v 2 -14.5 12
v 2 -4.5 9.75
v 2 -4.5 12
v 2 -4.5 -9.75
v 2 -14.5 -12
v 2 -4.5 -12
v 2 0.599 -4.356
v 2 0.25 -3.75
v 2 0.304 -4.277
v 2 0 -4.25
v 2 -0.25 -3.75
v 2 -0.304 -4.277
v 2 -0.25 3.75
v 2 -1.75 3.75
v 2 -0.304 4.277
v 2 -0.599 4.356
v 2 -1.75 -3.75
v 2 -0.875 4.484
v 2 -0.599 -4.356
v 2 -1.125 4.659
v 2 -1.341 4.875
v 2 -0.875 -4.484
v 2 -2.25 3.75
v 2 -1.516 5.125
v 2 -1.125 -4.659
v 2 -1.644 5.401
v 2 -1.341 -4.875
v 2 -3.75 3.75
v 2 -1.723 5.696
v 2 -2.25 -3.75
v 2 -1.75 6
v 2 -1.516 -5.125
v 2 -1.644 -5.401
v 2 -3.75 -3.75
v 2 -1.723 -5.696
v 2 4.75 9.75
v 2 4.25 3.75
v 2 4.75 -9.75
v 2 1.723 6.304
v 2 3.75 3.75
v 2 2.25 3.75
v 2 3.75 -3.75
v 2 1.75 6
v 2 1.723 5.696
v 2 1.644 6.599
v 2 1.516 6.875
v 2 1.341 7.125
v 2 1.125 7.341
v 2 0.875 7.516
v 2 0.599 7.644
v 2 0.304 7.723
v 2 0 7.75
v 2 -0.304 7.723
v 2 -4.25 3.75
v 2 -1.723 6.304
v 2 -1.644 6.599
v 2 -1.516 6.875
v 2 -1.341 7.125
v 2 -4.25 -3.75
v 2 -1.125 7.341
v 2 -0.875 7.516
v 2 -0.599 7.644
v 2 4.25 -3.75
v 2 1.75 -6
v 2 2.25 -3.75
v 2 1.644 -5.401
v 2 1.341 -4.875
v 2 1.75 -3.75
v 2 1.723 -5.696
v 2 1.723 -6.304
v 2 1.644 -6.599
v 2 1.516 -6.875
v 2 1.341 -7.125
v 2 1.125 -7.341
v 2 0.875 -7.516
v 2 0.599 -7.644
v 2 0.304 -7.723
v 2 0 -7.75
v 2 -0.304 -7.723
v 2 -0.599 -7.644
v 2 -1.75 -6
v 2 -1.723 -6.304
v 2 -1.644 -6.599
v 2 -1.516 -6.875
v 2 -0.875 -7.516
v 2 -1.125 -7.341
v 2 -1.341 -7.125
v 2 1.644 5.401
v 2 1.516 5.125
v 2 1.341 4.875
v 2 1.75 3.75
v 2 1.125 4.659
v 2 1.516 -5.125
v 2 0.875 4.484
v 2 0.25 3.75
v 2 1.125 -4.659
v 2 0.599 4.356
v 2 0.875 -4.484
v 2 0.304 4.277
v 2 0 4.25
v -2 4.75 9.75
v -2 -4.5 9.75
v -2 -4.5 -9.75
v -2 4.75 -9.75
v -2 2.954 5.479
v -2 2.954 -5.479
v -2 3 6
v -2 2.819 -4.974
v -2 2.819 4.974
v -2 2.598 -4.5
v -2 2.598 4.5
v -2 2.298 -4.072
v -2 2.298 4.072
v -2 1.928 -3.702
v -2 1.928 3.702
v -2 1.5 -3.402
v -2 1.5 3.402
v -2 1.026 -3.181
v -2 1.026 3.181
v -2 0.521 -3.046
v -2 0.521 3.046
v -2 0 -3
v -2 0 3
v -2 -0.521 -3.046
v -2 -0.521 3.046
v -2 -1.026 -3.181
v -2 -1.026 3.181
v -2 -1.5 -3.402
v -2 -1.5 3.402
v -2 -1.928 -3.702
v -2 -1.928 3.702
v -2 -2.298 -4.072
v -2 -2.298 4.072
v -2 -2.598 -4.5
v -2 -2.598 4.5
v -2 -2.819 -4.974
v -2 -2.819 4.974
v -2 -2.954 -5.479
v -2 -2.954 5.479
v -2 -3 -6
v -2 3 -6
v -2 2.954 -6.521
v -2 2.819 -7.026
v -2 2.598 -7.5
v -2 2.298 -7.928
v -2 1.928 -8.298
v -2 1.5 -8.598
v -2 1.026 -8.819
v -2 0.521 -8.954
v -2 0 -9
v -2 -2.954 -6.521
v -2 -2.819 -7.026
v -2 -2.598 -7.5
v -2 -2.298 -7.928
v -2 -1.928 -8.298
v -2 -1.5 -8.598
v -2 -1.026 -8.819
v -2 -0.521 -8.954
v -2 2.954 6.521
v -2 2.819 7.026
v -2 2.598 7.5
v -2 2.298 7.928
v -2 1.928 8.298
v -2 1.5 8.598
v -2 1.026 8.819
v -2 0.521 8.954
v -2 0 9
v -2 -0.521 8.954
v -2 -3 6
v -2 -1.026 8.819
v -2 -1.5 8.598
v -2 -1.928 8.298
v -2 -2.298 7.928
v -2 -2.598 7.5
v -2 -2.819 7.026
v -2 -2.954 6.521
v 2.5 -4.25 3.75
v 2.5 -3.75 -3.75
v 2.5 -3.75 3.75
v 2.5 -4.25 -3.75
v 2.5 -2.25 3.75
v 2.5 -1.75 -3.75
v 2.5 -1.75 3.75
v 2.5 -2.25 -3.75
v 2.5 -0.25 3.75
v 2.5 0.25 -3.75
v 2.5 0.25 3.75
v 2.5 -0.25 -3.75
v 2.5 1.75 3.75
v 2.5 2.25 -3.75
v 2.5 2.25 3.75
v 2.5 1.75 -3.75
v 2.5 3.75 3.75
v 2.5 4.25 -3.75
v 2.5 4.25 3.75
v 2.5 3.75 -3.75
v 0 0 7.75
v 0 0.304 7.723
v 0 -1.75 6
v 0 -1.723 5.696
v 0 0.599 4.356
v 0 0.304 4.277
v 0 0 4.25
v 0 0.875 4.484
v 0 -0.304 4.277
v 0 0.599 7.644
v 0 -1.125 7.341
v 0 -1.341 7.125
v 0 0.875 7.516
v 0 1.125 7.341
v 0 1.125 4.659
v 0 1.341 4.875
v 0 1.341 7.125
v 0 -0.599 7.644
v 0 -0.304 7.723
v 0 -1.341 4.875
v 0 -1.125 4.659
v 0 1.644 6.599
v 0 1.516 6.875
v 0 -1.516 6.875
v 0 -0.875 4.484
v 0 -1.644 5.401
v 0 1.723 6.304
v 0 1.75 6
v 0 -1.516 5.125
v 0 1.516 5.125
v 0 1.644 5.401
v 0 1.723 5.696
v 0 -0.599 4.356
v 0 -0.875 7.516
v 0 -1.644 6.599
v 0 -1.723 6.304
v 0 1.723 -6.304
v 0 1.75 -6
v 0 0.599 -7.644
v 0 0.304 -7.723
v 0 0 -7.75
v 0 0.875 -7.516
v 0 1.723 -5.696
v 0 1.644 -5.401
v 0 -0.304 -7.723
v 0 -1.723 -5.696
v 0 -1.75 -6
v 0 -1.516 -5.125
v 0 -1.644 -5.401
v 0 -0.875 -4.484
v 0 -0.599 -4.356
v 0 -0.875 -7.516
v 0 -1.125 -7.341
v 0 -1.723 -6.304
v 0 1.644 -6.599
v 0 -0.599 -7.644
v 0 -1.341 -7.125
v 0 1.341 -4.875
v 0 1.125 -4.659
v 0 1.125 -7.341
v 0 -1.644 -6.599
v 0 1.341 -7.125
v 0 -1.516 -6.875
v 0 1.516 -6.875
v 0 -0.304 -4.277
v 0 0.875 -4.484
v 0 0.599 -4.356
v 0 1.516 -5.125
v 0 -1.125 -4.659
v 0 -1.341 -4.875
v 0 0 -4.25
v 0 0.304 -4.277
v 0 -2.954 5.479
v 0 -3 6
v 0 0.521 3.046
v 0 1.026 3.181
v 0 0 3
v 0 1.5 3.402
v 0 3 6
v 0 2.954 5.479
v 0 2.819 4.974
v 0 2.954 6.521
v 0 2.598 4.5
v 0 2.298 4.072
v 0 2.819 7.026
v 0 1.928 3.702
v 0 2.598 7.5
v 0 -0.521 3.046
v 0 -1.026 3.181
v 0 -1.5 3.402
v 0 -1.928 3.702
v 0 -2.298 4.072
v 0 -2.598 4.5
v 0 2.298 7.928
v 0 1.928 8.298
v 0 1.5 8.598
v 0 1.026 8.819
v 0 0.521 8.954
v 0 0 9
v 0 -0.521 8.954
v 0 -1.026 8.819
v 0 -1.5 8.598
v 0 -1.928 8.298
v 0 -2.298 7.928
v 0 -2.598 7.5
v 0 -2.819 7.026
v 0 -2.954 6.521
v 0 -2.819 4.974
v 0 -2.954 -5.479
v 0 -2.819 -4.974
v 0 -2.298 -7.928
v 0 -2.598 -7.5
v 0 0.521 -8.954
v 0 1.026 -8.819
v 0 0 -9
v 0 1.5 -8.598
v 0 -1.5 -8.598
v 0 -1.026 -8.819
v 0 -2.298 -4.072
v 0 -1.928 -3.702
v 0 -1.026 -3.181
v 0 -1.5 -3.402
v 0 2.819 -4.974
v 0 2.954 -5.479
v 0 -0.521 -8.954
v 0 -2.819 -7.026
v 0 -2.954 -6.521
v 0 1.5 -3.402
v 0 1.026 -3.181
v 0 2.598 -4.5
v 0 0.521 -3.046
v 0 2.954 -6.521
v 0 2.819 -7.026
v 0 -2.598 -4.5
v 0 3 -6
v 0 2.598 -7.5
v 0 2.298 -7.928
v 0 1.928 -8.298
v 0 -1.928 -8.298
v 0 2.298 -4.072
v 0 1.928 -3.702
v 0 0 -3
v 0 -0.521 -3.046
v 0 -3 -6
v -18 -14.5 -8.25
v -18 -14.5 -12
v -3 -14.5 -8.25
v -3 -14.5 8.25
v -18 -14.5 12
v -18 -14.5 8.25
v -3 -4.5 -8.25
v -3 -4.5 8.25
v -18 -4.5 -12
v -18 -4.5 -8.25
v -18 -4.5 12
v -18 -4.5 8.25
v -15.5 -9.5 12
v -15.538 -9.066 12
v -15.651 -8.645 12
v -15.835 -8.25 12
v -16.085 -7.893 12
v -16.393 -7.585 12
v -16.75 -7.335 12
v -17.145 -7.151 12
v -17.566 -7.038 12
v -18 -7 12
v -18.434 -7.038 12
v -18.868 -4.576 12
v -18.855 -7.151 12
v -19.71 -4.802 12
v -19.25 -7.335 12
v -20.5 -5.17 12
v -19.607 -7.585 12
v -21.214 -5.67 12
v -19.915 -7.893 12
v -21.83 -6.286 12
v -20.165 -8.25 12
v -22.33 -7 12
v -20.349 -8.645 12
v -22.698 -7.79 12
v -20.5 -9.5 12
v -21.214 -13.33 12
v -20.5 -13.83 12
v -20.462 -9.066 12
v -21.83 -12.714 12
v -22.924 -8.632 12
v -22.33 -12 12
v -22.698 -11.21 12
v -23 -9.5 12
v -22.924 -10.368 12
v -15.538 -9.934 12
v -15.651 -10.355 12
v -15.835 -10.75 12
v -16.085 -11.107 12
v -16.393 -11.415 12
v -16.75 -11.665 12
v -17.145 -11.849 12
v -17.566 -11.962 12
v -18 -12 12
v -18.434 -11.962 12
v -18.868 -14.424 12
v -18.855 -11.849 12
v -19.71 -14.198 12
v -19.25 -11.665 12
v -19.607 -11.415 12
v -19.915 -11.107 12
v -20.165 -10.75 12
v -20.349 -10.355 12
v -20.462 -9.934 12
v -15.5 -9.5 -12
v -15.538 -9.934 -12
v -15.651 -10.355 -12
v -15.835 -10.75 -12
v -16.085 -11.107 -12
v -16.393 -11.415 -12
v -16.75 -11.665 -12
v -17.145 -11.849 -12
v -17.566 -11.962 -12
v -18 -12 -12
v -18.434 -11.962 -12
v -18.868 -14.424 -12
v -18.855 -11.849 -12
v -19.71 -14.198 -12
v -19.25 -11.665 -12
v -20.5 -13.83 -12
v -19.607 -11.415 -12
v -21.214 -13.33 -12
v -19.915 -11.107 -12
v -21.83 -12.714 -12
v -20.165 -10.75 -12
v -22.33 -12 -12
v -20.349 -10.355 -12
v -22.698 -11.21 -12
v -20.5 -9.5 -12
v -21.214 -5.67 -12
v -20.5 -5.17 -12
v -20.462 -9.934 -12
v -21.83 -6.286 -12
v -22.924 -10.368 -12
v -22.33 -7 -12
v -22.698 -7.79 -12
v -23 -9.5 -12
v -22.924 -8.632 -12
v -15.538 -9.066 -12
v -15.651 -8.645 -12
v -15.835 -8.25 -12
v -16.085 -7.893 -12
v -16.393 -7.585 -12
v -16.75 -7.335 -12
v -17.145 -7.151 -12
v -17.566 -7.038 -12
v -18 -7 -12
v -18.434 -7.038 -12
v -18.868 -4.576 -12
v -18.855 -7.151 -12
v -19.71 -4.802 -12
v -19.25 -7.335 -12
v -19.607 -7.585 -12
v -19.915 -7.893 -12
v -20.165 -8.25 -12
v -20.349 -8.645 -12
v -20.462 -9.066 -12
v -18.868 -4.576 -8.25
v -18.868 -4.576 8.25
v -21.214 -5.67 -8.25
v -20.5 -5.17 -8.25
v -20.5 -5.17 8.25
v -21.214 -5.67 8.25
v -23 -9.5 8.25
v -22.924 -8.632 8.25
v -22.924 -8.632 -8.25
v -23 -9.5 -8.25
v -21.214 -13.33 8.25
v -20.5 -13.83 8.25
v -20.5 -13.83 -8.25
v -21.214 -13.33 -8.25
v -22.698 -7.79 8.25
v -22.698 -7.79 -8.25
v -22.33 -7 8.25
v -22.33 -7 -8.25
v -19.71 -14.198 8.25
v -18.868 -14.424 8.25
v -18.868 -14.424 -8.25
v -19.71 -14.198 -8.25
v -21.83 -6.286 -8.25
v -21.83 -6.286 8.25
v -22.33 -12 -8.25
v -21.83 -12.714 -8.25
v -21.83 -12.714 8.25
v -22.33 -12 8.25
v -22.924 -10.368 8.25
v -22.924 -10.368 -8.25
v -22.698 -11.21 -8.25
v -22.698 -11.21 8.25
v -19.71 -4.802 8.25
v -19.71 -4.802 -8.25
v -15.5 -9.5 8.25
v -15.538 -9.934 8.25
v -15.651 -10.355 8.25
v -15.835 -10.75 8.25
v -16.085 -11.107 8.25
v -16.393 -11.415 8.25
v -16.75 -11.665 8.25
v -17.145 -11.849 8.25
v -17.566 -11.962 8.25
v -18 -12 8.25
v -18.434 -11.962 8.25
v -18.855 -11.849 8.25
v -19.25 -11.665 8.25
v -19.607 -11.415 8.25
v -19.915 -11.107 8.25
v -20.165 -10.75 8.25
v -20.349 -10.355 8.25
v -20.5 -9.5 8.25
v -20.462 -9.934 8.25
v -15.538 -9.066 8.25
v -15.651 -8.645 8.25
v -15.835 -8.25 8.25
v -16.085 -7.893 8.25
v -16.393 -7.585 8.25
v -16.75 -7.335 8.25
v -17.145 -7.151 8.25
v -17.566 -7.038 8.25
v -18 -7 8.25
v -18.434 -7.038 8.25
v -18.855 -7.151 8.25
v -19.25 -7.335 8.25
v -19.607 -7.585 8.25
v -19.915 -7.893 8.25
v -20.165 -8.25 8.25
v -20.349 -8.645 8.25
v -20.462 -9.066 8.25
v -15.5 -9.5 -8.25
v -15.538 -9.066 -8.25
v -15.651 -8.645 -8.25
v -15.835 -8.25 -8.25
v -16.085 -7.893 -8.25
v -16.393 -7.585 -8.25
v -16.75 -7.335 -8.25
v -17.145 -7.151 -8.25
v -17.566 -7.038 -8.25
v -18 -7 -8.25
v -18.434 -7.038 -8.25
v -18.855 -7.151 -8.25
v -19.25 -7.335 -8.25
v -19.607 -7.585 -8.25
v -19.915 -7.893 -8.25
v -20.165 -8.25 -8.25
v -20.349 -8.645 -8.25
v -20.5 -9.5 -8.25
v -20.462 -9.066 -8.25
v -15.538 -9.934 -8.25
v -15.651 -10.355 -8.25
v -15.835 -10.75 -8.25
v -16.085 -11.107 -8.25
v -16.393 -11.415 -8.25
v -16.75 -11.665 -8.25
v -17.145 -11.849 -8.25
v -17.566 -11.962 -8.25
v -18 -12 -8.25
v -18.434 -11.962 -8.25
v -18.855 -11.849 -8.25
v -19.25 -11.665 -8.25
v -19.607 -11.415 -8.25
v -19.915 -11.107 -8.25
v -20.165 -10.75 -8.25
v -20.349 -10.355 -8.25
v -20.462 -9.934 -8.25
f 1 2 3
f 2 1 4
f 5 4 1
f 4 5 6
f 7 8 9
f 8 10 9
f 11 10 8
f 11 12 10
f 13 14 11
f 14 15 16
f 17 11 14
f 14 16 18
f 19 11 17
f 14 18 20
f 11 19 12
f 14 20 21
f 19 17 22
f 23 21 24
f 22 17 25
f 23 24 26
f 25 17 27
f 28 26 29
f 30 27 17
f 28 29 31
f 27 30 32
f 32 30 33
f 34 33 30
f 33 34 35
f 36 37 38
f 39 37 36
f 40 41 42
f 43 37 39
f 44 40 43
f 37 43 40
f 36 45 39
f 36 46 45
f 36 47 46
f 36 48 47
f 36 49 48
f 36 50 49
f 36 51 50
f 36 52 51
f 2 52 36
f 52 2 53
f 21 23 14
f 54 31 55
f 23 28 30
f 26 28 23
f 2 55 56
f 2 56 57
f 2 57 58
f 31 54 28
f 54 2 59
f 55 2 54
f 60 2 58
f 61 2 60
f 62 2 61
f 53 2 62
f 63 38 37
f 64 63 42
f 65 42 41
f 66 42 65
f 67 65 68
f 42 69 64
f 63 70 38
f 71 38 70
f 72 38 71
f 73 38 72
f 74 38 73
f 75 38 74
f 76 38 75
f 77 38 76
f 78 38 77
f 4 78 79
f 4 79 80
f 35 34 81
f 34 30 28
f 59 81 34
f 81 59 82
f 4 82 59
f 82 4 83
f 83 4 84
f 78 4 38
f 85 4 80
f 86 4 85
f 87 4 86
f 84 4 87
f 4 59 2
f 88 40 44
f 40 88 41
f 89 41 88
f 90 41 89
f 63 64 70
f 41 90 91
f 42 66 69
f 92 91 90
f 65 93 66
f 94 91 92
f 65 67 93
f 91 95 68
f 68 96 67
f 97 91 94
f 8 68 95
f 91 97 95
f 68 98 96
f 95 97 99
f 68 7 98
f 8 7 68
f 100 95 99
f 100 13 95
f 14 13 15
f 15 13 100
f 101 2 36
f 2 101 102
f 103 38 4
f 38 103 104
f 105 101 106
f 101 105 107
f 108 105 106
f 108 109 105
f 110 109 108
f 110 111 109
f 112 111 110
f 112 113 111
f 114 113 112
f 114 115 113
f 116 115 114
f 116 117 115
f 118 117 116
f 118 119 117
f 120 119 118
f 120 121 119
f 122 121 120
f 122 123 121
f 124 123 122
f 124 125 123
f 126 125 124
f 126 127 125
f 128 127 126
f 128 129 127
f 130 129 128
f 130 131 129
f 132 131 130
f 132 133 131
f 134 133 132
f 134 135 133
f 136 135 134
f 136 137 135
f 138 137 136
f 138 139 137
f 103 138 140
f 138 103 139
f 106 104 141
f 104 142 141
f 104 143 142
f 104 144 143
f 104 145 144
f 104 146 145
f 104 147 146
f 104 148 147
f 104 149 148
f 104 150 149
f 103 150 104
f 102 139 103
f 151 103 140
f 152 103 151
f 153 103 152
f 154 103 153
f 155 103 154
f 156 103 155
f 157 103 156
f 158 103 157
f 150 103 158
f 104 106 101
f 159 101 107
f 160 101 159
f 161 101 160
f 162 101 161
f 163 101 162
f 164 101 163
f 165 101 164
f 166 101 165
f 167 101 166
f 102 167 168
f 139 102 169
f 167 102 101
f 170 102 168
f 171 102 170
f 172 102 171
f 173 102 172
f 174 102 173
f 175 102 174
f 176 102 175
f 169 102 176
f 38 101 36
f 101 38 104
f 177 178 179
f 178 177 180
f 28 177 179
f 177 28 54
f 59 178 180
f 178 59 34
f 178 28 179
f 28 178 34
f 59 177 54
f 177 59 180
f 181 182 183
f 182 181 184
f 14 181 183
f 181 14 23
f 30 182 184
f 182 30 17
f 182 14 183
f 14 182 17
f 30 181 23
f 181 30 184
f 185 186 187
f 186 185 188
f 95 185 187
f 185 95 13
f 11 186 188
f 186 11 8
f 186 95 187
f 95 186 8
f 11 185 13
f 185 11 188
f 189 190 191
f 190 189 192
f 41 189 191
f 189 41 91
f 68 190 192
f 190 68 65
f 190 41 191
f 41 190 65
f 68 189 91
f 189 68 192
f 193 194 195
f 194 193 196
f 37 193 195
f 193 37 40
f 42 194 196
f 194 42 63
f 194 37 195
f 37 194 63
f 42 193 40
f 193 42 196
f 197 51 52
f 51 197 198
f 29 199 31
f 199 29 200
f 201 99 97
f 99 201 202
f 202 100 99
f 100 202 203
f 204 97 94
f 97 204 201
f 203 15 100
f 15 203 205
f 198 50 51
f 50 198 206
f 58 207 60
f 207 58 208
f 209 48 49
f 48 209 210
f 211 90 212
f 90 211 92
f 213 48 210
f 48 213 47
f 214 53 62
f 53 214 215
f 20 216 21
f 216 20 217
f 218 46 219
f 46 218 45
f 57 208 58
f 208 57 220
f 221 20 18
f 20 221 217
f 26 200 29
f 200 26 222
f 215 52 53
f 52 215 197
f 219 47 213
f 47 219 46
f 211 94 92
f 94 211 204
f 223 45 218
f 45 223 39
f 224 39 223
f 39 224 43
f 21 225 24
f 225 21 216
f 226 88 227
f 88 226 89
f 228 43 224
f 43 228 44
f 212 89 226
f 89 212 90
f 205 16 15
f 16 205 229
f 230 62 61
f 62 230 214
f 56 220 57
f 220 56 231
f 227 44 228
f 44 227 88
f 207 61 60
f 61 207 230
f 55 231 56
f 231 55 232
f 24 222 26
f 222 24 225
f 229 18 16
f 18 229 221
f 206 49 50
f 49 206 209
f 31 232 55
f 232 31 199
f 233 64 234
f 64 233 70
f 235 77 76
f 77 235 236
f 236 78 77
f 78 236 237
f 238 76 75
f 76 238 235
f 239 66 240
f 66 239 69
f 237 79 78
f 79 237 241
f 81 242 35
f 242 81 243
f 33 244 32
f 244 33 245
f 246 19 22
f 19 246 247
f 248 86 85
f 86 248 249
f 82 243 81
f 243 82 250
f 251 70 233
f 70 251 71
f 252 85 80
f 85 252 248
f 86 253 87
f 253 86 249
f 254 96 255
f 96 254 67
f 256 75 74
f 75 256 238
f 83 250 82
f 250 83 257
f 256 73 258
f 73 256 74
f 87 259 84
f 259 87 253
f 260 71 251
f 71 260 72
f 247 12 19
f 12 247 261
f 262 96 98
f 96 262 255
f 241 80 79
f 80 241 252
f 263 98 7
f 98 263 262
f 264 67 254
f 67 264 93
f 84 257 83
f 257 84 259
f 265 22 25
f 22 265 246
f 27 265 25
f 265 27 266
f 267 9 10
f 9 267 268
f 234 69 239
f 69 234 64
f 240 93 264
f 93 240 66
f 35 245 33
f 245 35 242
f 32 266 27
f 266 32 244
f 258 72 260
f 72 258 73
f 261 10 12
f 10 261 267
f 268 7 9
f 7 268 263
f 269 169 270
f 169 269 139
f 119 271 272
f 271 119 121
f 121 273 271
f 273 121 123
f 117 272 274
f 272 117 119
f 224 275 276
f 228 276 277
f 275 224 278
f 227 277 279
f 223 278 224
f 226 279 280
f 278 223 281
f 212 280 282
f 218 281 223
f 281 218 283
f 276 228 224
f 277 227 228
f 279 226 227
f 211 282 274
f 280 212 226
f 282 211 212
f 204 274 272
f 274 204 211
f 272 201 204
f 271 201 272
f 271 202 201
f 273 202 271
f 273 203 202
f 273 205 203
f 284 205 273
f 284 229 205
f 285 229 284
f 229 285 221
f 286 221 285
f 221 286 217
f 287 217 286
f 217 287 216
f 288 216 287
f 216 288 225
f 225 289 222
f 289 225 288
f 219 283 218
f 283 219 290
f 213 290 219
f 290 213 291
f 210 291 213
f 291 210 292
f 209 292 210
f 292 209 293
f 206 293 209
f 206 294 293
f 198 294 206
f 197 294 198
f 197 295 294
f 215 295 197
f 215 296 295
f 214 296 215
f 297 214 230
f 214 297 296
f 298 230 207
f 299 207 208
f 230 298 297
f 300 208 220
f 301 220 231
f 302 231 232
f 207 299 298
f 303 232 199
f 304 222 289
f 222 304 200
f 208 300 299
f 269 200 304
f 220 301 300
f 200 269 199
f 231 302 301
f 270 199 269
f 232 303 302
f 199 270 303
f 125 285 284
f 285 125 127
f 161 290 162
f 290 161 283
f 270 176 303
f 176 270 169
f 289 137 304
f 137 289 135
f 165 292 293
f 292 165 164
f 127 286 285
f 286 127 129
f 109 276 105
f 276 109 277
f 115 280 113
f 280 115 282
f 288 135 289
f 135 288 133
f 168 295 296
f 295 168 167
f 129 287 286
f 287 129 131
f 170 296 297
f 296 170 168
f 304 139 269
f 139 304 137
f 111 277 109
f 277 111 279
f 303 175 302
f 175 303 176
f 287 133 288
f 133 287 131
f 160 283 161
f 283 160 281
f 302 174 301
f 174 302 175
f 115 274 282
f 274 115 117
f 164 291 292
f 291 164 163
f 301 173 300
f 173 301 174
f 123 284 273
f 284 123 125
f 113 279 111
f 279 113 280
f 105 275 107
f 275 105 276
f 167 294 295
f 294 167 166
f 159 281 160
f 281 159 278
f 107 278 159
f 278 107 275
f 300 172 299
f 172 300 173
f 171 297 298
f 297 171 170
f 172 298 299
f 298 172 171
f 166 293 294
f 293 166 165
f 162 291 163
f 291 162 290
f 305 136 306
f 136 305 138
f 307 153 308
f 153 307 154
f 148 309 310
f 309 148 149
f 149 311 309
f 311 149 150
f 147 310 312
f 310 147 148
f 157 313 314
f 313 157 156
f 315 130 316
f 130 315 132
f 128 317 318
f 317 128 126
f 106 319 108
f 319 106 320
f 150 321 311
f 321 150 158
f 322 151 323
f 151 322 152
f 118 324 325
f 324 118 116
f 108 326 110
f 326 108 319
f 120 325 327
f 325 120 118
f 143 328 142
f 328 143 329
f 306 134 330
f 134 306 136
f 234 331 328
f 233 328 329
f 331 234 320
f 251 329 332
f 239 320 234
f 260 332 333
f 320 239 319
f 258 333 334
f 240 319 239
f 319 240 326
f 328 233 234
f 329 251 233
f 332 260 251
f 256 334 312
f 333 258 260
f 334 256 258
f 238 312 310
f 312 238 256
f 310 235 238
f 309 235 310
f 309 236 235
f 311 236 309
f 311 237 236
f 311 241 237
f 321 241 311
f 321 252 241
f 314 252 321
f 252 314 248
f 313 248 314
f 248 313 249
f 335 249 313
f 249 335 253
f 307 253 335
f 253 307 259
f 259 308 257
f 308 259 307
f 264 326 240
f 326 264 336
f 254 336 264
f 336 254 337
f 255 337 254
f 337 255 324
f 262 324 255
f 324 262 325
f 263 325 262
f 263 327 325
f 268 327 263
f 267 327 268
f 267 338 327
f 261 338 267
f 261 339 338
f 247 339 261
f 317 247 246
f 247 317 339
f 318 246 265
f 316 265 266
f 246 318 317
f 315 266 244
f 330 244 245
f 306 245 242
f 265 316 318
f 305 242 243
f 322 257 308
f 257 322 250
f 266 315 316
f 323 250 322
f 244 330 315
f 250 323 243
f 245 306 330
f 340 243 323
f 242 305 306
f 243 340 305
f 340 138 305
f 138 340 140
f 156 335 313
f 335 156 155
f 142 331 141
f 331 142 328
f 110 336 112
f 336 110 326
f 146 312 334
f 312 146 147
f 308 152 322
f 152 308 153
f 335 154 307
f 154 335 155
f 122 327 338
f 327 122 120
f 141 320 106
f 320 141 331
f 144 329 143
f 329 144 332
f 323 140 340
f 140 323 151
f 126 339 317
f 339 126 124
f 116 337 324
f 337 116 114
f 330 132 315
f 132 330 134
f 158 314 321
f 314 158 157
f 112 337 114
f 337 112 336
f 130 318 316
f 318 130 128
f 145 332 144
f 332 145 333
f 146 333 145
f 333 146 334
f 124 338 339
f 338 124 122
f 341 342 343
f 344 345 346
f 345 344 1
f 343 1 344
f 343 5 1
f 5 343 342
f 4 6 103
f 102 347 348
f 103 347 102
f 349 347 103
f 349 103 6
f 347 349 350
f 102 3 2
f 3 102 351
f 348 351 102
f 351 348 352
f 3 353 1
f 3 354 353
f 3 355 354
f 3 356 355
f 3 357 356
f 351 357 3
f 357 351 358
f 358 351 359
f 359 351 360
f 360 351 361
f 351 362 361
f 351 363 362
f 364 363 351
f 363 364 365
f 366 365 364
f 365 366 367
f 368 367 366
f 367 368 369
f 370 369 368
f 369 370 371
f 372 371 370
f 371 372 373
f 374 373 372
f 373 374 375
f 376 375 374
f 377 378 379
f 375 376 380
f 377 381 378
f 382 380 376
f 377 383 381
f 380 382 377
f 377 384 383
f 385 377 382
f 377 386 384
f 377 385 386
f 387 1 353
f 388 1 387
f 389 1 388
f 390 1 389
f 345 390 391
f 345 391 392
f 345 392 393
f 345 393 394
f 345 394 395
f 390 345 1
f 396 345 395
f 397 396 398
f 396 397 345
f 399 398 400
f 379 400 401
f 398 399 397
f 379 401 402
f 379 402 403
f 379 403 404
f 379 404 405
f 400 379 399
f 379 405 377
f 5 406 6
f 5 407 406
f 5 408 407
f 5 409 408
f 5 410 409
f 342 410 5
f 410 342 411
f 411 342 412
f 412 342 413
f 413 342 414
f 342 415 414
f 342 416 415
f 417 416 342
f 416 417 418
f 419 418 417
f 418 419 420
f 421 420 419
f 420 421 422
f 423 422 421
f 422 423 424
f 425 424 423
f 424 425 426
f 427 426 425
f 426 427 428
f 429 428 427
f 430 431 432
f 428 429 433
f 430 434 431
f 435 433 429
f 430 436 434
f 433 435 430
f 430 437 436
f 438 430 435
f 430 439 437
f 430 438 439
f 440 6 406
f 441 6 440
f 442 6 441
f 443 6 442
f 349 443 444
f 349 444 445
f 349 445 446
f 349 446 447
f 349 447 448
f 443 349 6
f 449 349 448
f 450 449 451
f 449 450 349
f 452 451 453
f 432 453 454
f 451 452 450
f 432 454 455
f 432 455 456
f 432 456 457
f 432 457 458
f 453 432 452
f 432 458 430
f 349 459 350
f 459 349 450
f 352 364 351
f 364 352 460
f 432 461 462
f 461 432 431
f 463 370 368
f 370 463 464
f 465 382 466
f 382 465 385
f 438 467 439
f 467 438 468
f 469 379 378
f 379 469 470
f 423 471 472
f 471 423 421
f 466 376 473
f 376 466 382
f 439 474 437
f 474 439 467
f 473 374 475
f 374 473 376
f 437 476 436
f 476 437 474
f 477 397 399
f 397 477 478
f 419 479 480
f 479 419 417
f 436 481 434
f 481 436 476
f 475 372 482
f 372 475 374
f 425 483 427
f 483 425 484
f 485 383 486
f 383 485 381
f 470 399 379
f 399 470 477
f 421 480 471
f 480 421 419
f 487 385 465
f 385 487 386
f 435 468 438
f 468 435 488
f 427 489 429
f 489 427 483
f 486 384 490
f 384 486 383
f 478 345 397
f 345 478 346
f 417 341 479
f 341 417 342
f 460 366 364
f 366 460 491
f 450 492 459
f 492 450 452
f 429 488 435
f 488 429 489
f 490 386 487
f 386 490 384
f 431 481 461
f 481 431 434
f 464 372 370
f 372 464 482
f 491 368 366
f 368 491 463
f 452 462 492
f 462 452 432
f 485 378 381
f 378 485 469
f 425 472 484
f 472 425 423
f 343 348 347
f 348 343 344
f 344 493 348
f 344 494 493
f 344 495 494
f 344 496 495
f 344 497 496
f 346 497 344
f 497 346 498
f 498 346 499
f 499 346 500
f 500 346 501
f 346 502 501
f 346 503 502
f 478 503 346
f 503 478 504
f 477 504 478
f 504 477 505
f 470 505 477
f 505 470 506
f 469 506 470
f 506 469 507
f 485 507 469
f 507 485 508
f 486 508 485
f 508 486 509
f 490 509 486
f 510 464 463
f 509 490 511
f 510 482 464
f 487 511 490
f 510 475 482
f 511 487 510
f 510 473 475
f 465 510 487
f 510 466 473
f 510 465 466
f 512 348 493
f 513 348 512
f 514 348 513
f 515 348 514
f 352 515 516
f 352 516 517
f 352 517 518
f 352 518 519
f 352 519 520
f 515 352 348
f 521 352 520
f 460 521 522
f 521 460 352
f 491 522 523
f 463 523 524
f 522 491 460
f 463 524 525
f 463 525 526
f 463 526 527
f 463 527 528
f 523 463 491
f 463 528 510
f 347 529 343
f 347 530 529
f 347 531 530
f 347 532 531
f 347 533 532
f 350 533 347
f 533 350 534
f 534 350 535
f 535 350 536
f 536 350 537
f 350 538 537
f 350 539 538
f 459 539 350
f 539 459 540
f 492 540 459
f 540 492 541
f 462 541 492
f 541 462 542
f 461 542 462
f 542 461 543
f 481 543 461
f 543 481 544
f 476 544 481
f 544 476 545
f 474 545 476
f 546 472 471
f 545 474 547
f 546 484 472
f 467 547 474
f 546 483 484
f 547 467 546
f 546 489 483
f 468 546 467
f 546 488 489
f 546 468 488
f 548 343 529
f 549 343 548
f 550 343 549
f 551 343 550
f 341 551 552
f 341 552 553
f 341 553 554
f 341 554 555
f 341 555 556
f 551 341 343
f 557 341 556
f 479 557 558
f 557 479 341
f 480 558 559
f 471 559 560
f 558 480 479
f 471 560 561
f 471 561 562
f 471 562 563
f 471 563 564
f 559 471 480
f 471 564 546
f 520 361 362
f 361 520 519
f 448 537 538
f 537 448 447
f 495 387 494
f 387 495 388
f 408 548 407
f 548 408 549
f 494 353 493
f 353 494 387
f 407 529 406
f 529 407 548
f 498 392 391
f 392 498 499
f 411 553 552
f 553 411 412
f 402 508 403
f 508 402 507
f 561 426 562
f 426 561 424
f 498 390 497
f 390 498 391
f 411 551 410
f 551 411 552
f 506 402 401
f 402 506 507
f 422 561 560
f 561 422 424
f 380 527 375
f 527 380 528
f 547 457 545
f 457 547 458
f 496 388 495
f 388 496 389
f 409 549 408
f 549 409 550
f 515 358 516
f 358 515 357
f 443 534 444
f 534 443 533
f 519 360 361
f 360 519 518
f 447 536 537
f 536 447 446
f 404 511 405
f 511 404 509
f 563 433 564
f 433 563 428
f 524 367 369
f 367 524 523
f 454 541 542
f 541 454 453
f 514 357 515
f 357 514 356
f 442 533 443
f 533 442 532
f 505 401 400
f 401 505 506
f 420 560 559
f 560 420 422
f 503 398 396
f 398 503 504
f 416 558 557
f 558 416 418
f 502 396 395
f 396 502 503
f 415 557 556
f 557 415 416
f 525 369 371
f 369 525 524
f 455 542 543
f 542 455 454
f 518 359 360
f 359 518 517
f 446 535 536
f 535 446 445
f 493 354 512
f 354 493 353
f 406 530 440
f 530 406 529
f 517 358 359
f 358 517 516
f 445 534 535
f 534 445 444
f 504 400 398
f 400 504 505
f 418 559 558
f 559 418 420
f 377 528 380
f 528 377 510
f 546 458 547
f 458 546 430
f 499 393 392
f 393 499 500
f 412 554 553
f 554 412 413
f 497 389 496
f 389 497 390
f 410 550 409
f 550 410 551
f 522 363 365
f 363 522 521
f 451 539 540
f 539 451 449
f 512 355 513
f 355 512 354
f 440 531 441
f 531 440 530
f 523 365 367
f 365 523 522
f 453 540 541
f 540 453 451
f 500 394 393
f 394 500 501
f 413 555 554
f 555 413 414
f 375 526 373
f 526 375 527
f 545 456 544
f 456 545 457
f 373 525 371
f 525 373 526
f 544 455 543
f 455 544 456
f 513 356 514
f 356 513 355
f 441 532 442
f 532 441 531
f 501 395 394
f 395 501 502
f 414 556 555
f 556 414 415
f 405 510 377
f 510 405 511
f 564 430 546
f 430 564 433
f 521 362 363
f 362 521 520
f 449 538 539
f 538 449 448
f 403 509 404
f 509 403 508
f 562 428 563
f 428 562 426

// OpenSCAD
/*
 * Machdyne PNP
 * Copyright (c) 2023 Lone Dynamics Corporation. All rights reserved.
 *
 * Belt Clamp
 *
 * This part attaches to the gantry mount (xgm) in order to hold the belt ends in place.
 *
 * Optionally has a mount point for the drag chain.
 *
 */
 
$fn = 36;
 
has_dc_mount = true;
 
gmbc();
 
module gmbc() {
	
	difference() {
	
		union() {
			cube([4,9.5,19.5], center=true);
			
			translate([2,-4,0]) cube([1,0.5,7.5], center=true);
			translate([2,-2,0]) cube([1,0.5,7.5], center=true);
			translate([2,0,0]) cube([1,0.5,7.5], center=true);
			translate([2,2,0]) cube([1,0.5,7.5], center=true);
			translate([2,4,0]) cube([1,0.5,7.5], center=true);
			
		}
		
		rotate([0,90,0]) {
			translate([-6,0,0]) cylinder(d=3.5, h=100, center=true);
			translate([6,0,0]) cylinder(d=3.5, h=100, center=true);
			translate([-6,0,-2.5]) cylinder(d=6, h=5, center=true);
			translate([6,0,-2.5]) cylinder(d=6, h=5, center=true);

		}


	}
	
	if (has_dc_mount) {
	
		translate([-8,-9.5,0]) rotate([90,0,0]) {
		
			difference() {
				
				union() {
					cube([20,24,10], center=true);	
					translate([-10,0,0]) rotate([90,0,0]) cylinder(d=10, h=24, center=true);
				}
		
				translate([-27.5,0,2]) cube([50,14,20], center=true);		
				translate([-25,0,2]) cube([60,16.5,20], center=true);		
		
				translate([-10,0,0]) rotate([90,0,0]) cylinder(d=5, h=30, center=true);

			}

		}
		
	}
	
}
